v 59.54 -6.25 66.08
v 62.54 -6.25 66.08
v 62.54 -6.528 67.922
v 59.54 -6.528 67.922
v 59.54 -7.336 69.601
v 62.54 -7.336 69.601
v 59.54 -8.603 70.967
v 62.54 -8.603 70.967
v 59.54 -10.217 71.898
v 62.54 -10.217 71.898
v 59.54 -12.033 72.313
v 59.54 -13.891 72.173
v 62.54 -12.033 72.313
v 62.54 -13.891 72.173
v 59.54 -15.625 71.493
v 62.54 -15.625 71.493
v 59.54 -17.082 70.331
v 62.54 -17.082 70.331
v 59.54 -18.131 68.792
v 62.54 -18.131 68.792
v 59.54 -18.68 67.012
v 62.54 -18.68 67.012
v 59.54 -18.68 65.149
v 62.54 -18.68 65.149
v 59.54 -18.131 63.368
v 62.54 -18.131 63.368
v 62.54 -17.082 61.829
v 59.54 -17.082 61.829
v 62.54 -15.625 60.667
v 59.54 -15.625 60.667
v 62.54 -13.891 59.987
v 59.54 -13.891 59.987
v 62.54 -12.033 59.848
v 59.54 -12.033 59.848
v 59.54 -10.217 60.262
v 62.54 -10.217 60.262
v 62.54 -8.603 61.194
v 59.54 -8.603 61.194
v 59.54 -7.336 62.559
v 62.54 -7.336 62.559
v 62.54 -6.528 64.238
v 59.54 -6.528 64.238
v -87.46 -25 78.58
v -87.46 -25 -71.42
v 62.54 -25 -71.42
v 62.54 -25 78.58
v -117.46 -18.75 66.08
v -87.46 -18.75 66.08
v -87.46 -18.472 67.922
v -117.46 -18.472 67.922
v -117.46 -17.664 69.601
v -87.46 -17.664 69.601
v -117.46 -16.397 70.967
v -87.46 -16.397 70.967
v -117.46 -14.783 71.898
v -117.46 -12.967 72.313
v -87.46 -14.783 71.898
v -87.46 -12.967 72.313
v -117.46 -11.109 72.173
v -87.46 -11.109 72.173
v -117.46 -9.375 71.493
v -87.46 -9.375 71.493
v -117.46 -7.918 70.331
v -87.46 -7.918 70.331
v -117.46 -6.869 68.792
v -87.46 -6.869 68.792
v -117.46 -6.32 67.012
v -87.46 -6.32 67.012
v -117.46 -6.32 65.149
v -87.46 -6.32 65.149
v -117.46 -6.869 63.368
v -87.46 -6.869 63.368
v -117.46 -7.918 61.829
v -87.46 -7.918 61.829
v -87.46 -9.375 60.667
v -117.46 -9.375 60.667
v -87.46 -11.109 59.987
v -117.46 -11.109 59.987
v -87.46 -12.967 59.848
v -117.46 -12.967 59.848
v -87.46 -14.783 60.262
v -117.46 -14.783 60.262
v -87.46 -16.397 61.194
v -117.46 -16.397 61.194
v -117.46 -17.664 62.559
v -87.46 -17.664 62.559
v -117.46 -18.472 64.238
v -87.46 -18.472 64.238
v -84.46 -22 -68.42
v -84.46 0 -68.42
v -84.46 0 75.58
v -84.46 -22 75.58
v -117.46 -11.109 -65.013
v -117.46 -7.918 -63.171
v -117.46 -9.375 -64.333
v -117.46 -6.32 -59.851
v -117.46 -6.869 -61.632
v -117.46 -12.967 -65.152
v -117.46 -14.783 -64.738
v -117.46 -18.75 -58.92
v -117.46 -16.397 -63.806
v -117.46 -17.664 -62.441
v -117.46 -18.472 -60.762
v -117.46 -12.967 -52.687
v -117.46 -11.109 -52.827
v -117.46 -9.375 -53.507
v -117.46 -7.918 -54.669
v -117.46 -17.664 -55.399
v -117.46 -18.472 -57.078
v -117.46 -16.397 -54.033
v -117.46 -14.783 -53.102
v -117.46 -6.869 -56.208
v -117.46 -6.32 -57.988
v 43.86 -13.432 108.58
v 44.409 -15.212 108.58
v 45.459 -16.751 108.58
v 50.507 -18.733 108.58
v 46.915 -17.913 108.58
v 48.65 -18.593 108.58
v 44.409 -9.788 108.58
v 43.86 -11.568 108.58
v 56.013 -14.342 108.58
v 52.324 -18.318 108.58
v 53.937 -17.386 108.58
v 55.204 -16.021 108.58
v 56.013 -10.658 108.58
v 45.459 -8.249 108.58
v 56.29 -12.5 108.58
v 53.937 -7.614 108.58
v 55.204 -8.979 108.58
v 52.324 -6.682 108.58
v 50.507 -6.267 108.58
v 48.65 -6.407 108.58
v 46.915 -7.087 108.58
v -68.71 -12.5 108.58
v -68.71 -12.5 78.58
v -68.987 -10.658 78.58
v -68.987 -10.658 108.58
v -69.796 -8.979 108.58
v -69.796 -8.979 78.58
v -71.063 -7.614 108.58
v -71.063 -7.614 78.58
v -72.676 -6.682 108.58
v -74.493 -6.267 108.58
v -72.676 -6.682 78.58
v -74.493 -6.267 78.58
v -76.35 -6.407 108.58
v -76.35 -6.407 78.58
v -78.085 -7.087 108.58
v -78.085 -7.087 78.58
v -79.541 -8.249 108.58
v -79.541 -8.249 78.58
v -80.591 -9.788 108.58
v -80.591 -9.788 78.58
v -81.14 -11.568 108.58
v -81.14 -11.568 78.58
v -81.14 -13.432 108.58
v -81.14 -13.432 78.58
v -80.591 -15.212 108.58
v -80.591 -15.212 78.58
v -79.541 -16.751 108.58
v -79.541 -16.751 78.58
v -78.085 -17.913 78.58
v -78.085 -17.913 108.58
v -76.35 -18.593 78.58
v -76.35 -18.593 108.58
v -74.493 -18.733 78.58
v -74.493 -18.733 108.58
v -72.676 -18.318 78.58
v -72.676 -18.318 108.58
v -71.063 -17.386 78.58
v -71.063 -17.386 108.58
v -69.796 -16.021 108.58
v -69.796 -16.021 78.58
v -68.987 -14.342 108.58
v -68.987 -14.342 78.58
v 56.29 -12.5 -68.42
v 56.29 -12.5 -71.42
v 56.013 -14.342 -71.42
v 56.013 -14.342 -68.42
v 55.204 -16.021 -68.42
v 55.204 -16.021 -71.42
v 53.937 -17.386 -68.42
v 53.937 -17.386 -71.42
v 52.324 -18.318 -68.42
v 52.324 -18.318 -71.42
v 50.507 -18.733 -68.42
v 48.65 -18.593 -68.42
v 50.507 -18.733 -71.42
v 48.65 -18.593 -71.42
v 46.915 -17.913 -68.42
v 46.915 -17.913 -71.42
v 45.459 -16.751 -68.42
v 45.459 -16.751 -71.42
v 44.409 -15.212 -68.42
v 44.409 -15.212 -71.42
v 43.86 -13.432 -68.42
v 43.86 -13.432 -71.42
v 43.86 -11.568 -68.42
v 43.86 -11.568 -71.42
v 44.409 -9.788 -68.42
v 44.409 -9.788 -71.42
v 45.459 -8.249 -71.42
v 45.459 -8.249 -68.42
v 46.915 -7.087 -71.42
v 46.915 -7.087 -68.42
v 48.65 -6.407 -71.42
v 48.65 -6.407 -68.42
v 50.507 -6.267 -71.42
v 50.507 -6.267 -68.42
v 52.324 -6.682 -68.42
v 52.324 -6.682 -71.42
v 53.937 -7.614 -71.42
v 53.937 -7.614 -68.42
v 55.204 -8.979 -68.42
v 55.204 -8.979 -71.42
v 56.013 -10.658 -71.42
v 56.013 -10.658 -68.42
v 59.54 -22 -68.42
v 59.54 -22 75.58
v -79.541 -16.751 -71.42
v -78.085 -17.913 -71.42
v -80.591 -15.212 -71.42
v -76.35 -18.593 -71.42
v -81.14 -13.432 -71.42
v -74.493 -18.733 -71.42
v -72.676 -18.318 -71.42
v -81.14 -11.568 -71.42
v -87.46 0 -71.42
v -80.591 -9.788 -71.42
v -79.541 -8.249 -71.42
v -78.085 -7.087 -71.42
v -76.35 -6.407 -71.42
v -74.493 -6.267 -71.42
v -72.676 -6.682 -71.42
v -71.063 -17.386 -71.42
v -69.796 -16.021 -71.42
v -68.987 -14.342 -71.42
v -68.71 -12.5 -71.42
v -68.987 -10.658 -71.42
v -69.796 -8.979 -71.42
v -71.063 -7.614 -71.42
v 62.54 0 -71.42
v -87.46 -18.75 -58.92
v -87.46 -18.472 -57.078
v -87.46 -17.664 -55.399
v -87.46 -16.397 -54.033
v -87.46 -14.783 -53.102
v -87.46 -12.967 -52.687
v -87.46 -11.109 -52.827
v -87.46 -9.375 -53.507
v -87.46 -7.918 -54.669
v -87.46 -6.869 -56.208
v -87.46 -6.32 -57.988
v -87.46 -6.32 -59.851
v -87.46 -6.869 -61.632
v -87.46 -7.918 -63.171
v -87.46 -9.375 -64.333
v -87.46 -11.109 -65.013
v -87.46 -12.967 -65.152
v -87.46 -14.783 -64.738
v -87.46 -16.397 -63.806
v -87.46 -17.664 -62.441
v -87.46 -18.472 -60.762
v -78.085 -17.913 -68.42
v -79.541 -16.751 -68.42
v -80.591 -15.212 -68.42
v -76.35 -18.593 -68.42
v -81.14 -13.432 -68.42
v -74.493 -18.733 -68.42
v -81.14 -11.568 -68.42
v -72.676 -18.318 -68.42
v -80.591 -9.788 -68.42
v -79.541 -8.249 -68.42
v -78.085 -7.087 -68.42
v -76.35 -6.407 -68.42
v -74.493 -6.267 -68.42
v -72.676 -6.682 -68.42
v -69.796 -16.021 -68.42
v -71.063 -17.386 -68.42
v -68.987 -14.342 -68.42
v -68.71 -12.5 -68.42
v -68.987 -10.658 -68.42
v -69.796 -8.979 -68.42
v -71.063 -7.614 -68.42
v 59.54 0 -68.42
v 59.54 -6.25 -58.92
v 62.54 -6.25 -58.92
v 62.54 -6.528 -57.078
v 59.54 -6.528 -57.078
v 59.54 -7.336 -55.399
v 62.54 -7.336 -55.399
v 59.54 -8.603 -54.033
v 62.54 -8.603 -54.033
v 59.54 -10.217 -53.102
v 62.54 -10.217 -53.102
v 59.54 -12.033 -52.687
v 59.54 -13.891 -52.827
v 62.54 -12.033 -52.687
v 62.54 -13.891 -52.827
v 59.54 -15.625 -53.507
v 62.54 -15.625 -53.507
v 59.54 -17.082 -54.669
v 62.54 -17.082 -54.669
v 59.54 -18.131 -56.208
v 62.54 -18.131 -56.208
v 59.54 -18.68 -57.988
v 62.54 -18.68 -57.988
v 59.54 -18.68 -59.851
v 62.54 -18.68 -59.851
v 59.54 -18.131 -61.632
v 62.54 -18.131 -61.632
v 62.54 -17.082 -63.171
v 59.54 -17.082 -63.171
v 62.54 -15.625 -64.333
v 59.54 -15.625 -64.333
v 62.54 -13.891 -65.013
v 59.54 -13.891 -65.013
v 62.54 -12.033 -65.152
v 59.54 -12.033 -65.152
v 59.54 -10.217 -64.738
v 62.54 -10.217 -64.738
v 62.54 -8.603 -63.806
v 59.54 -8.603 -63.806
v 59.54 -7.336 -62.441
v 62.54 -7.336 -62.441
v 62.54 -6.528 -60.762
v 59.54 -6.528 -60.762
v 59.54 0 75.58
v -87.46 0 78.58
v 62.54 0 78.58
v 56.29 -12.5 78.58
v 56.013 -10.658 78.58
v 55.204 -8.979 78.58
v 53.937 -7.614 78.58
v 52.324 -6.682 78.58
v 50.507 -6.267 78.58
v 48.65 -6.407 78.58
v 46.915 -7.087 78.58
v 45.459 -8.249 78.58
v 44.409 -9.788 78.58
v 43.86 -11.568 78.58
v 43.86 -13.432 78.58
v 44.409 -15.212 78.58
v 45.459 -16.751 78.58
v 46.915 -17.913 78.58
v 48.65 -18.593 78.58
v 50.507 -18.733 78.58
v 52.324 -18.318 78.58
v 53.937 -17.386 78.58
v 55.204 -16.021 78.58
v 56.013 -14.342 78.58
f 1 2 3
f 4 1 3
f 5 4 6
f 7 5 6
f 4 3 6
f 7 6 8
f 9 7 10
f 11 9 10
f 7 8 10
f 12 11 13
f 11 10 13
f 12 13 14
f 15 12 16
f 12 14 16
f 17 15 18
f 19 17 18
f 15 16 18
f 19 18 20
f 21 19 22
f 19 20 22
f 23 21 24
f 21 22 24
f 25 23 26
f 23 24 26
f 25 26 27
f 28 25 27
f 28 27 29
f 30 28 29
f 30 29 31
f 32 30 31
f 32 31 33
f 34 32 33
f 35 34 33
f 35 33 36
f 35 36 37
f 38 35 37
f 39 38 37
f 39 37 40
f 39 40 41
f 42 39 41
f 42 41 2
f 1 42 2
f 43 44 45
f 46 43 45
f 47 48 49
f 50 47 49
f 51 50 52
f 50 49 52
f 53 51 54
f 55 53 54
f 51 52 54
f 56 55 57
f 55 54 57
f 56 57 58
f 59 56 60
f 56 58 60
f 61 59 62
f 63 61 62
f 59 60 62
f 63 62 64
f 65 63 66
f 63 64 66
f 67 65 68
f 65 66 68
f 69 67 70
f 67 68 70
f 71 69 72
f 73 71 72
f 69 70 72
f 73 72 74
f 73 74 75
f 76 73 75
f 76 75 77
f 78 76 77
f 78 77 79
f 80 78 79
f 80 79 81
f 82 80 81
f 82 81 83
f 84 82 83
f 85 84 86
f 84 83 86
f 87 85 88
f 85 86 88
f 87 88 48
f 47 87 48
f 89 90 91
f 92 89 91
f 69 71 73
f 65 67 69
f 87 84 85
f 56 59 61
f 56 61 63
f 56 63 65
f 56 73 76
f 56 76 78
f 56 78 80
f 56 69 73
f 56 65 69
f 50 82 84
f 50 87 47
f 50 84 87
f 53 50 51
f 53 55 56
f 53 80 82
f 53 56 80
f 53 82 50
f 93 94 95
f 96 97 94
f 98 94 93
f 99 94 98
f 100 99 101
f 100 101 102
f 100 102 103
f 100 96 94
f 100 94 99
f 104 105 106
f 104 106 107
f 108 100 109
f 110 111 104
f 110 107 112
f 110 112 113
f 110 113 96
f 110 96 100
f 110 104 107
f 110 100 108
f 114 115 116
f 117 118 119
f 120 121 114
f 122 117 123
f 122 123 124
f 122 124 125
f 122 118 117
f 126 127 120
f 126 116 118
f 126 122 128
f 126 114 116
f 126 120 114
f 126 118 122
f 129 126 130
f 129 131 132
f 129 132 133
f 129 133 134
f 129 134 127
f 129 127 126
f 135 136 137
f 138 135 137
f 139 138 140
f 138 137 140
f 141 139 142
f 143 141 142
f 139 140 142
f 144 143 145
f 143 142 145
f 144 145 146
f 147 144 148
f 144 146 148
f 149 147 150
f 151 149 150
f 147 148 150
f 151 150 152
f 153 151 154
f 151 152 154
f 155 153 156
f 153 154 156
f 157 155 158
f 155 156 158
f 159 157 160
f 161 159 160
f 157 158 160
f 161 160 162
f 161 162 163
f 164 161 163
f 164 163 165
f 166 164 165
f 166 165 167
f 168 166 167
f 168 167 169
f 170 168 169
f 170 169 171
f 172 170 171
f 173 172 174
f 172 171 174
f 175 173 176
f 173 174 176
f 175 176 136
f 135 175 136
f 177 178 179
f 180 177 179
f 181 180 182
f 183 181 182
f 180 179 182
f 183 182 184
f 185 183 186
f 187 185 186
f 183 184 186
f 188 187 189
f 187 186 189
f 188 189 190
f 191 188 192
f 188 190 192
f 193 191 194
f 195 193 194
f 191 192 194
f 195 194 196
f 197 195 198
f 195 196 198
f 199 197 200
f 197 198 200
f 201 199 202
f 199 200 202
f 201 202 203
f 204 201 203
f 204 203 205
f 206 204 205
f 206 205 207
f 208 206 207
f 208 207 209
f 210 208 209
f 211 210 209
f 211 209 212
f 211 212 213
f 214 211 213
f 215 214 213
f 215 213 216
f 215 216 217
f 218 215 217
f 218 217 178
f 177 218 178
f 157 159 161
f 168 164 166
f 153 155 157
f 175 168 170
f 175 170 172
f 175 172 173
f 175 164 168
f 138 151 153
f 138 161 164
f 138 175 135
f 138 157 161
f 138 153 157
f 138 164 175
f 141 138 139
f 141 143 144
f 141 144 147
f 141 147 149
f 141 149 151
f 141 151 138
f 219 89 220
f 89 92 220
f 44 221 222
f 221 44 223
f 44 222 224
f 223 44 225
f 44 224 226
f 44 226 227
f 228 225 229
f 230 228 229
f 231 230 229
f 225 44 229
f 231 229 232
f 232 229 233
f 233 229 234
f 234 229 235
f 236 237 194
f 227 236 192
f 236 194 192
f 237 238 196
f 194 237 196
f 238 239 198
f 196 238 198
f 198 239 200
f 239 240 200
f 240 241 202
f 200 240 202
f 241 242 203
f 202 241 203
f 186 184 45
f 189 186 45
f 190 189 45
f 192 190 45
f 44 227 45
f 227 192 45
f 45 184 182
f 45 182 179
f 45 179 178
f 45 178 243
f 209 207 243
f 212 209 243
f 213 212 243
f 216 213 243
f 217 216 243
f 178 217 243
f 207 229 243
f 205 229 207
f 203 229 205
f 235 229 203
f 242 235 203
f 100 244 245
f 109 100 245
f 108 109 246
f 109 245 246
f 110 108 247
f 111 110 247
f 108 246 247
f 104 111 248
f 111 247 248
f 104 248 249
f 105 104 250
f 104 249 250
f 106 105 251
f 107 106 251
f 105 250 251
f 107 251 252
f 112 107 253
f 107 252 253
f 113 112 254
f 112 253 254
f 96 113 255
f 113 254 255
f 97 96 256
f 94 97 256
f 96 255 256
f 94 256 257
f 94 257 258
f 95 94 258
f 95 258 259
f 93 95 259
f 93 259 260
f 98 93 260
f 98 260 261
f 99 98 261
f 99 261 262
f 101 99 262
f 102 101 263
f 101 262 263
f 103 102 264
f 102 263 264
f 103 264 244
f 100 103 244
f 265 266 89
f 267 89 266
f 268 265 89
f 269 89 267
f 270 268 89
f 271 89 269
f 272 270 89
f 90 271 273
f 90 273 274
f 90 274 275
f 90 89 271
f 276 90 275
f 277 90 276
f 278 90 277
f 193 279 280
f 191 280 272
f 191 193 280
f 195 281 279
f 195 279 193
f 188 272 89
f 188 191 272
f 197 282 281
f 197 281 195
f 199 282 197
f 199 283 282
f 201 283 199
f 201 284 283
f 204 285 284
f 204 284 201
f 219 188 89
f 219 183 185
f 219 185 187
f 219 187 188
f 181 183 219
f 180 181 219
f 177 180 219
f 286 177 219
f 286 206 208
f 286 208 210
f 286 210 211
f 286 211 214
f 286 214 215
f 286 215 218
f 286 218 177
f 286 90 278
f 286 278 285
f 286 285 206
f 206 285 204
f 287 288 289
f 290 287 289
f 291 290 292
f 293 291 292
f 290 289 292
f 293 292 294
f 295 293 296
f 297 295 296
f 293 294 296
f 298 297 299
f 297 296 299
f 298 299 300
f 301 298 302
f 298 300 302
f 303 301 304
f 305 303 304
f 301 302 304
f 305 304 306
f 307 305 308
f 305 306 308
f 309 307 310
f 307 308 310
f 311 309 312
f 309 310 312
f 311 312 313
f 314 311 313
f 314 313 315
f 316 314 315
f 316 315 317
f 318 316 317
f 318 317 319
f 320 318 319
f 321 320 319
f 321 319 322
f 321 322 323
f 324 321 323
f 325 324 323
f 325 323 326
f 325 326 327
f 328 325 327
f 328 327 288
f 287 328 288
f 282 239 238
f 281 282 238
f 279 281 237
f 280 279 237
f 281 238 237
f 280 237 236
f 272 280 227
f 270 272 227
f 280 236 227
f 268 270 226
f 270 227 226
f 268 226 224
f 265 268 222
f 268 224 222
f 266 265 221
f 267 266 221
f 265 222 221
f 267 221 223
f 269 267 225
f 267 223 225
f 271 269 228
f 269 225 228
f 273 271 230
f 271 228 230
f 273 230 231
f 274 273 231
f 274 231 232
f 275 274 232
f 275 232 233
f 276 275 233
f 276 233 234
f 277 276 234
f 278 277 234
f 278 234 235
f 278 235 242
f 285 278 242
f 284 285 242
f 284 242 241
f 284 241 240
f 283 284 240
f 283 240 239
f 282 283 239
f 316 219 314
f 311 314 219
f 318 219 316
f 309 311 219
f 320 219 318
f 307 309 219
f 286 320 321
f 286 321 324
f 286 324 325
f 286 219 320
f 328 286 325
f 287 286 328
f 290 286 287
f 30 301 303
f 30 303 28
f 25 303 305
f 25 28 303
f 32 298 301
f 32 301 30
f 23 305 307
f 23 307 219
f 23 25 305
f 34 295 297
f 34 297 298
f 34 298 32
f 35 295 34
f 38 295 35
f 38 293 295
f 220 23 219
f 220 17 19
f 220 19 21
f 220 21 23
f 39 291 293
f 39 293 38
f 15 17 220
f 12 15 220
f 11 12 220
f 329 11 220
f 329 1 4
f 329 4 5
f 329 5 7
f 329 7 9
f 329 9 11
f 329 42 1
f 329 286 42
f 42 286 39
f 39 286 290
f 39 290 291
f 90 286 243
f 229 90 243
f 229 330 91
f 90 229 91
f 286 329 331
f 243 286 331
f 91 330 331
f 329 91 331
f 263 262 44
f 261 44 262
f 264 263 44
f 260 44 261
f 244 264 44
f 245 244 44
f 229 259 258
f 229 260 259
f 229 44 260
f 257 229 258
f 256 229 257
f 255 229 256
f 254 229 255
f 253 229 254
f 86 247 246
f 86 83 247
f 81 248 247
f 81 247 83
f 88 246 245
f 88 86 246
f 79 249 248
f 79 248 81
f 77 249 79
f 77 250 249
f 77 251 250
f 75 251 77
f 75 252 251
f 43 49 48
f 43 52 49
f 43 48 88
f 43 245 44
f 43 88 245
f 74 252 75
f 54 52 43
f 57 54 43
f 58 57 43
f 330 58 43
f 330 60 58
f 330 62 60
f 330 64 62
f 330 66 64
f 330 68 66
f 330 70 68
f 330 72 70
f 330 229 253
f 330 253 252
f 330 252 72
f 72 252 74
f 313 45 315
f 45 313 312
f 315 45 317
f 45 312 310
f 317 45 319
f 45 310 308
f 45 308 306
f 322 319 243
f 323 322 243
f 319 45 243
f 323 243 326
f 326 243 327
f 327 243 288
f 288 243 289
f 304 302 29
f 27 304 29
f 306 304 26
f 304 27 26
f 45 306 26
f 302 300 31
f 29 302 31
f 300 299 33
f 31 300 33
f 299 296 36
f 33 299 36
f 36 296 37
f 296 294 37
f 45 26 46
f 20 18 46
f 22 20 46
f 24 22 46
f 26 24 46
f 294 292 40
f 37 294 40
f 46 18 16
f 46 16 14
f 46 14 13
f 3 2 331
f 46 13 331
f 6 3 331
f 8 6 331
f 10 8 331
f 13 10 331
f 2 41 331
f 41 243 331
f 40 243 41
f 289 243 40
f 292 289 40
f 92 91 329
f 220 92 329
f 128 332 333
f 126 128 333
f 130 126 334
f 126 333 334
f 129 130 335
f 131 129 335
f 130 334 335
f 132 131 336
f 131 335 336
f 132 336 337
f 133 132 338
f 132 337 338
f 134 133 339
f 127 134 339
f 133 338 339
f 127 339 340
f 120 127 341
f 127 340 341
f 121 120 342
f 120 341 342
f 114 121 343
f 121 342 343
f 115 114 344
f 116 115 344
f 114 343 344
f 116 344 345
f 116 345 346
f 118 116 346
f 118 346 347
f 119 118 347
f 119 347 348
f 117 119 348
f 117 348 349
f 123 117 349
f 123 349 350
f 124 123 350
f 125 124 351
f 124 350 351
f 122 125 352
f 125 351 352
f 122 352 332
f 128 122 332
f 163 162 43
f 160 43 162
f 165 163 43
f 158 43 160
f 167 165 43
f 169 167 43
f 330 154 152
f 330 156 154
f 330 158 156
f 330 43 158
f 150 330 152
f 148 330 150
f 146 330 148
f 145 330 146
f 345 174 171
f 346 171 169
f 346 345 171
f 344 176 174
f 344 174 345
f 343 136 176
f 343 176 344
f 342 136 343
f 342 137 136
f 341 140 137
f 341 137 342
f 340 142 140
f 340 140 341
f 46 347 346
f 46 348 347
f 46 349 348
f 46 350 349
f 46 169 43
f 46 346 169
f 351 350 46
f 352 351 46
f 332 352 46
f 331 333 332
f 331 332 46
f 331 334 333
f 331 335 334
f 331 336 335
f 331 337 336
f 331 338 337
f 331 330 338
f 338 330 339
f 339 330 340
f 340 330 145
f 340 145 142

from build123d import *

# Parameters (mm, degrees)
F0_W      = 150
F0_H      = 150
F1_DEPTH  = 25
F2_T      = -3
F3_R      = 6.25
F4_DEPTH  = 30
F5_R      = 6.25
F6_DEPTH  = 25
F7_R      = 6.25
F8_DEPTH  = 30
F9_R      = 6.25
F10_DEPTH = 30


with BuildPart() as f1:
    # F0 (on Front) → F1 (new body)
    with BuildSketch(Plane.XZ):
        with Locations((-12.459678, 3.580103)):
            Rectangle(F0_W, F0_H)
    extrude(amount=F1_DEPTH)

    # F2
    f2_openings = [f1.faces().sort_by_distance(p)[0] for p in [
        (-12.459678, 0, 3.580103),
    ]]
    offset(amount=F2_T, openings=f2_openings)

    # F3 (on face) → F4 (join)
    with BuildSketch(Plane.XY.offset(78.580103)):
        with Locations((-74.959678, -12.5)):
            Circle(F3_R)
        with Locations((50.040322, -12.5)):
            Circle(F3_R)
    extrude(amount=F4_DEPTH)

    # F5 (on face) → F6 (cut)
    with BuildSketch(Plane(origin=(0, 0, -71.419897), x_dir=(1, 0, 0), z_dir=(0, 0, -1))):
        with Locations((-74.959678, 12.5)):
            Circle(F5_R)
        with Locations((50.040322, 12.5)):
            Circle(F5_R)
    extrude(amount=-F6_DEPTH, mode=Mode.SUBTRACT)

    # F7 (on face) → F8 (join)
    with BuildSketch(Plane(origin=(-87.459678, 0, 0), x_dir=(0, -1, 0), z_dir=(-1, 0, 0))):
        with Locations((12.5, 66.080103)):
            Circle(F7_R)
        with Locations((12.5, -58.919897)):
            Circle(F7_R)
    extrude(amount=F8_DEPTH)

    # F9 (on face) → F10 (cut)
    with BuildSketch(Plane.YZ.offset(62.540322)):
        with Locations((-12.5, 66.080103)):
            Circle(F9_R)
        with Locations((-12.5, -58.919897)):
            Circle(F9_R)
    extrude(amount=-F10_DEPTH, mode=Mode.SUBTRACT)


solid = f1.part
